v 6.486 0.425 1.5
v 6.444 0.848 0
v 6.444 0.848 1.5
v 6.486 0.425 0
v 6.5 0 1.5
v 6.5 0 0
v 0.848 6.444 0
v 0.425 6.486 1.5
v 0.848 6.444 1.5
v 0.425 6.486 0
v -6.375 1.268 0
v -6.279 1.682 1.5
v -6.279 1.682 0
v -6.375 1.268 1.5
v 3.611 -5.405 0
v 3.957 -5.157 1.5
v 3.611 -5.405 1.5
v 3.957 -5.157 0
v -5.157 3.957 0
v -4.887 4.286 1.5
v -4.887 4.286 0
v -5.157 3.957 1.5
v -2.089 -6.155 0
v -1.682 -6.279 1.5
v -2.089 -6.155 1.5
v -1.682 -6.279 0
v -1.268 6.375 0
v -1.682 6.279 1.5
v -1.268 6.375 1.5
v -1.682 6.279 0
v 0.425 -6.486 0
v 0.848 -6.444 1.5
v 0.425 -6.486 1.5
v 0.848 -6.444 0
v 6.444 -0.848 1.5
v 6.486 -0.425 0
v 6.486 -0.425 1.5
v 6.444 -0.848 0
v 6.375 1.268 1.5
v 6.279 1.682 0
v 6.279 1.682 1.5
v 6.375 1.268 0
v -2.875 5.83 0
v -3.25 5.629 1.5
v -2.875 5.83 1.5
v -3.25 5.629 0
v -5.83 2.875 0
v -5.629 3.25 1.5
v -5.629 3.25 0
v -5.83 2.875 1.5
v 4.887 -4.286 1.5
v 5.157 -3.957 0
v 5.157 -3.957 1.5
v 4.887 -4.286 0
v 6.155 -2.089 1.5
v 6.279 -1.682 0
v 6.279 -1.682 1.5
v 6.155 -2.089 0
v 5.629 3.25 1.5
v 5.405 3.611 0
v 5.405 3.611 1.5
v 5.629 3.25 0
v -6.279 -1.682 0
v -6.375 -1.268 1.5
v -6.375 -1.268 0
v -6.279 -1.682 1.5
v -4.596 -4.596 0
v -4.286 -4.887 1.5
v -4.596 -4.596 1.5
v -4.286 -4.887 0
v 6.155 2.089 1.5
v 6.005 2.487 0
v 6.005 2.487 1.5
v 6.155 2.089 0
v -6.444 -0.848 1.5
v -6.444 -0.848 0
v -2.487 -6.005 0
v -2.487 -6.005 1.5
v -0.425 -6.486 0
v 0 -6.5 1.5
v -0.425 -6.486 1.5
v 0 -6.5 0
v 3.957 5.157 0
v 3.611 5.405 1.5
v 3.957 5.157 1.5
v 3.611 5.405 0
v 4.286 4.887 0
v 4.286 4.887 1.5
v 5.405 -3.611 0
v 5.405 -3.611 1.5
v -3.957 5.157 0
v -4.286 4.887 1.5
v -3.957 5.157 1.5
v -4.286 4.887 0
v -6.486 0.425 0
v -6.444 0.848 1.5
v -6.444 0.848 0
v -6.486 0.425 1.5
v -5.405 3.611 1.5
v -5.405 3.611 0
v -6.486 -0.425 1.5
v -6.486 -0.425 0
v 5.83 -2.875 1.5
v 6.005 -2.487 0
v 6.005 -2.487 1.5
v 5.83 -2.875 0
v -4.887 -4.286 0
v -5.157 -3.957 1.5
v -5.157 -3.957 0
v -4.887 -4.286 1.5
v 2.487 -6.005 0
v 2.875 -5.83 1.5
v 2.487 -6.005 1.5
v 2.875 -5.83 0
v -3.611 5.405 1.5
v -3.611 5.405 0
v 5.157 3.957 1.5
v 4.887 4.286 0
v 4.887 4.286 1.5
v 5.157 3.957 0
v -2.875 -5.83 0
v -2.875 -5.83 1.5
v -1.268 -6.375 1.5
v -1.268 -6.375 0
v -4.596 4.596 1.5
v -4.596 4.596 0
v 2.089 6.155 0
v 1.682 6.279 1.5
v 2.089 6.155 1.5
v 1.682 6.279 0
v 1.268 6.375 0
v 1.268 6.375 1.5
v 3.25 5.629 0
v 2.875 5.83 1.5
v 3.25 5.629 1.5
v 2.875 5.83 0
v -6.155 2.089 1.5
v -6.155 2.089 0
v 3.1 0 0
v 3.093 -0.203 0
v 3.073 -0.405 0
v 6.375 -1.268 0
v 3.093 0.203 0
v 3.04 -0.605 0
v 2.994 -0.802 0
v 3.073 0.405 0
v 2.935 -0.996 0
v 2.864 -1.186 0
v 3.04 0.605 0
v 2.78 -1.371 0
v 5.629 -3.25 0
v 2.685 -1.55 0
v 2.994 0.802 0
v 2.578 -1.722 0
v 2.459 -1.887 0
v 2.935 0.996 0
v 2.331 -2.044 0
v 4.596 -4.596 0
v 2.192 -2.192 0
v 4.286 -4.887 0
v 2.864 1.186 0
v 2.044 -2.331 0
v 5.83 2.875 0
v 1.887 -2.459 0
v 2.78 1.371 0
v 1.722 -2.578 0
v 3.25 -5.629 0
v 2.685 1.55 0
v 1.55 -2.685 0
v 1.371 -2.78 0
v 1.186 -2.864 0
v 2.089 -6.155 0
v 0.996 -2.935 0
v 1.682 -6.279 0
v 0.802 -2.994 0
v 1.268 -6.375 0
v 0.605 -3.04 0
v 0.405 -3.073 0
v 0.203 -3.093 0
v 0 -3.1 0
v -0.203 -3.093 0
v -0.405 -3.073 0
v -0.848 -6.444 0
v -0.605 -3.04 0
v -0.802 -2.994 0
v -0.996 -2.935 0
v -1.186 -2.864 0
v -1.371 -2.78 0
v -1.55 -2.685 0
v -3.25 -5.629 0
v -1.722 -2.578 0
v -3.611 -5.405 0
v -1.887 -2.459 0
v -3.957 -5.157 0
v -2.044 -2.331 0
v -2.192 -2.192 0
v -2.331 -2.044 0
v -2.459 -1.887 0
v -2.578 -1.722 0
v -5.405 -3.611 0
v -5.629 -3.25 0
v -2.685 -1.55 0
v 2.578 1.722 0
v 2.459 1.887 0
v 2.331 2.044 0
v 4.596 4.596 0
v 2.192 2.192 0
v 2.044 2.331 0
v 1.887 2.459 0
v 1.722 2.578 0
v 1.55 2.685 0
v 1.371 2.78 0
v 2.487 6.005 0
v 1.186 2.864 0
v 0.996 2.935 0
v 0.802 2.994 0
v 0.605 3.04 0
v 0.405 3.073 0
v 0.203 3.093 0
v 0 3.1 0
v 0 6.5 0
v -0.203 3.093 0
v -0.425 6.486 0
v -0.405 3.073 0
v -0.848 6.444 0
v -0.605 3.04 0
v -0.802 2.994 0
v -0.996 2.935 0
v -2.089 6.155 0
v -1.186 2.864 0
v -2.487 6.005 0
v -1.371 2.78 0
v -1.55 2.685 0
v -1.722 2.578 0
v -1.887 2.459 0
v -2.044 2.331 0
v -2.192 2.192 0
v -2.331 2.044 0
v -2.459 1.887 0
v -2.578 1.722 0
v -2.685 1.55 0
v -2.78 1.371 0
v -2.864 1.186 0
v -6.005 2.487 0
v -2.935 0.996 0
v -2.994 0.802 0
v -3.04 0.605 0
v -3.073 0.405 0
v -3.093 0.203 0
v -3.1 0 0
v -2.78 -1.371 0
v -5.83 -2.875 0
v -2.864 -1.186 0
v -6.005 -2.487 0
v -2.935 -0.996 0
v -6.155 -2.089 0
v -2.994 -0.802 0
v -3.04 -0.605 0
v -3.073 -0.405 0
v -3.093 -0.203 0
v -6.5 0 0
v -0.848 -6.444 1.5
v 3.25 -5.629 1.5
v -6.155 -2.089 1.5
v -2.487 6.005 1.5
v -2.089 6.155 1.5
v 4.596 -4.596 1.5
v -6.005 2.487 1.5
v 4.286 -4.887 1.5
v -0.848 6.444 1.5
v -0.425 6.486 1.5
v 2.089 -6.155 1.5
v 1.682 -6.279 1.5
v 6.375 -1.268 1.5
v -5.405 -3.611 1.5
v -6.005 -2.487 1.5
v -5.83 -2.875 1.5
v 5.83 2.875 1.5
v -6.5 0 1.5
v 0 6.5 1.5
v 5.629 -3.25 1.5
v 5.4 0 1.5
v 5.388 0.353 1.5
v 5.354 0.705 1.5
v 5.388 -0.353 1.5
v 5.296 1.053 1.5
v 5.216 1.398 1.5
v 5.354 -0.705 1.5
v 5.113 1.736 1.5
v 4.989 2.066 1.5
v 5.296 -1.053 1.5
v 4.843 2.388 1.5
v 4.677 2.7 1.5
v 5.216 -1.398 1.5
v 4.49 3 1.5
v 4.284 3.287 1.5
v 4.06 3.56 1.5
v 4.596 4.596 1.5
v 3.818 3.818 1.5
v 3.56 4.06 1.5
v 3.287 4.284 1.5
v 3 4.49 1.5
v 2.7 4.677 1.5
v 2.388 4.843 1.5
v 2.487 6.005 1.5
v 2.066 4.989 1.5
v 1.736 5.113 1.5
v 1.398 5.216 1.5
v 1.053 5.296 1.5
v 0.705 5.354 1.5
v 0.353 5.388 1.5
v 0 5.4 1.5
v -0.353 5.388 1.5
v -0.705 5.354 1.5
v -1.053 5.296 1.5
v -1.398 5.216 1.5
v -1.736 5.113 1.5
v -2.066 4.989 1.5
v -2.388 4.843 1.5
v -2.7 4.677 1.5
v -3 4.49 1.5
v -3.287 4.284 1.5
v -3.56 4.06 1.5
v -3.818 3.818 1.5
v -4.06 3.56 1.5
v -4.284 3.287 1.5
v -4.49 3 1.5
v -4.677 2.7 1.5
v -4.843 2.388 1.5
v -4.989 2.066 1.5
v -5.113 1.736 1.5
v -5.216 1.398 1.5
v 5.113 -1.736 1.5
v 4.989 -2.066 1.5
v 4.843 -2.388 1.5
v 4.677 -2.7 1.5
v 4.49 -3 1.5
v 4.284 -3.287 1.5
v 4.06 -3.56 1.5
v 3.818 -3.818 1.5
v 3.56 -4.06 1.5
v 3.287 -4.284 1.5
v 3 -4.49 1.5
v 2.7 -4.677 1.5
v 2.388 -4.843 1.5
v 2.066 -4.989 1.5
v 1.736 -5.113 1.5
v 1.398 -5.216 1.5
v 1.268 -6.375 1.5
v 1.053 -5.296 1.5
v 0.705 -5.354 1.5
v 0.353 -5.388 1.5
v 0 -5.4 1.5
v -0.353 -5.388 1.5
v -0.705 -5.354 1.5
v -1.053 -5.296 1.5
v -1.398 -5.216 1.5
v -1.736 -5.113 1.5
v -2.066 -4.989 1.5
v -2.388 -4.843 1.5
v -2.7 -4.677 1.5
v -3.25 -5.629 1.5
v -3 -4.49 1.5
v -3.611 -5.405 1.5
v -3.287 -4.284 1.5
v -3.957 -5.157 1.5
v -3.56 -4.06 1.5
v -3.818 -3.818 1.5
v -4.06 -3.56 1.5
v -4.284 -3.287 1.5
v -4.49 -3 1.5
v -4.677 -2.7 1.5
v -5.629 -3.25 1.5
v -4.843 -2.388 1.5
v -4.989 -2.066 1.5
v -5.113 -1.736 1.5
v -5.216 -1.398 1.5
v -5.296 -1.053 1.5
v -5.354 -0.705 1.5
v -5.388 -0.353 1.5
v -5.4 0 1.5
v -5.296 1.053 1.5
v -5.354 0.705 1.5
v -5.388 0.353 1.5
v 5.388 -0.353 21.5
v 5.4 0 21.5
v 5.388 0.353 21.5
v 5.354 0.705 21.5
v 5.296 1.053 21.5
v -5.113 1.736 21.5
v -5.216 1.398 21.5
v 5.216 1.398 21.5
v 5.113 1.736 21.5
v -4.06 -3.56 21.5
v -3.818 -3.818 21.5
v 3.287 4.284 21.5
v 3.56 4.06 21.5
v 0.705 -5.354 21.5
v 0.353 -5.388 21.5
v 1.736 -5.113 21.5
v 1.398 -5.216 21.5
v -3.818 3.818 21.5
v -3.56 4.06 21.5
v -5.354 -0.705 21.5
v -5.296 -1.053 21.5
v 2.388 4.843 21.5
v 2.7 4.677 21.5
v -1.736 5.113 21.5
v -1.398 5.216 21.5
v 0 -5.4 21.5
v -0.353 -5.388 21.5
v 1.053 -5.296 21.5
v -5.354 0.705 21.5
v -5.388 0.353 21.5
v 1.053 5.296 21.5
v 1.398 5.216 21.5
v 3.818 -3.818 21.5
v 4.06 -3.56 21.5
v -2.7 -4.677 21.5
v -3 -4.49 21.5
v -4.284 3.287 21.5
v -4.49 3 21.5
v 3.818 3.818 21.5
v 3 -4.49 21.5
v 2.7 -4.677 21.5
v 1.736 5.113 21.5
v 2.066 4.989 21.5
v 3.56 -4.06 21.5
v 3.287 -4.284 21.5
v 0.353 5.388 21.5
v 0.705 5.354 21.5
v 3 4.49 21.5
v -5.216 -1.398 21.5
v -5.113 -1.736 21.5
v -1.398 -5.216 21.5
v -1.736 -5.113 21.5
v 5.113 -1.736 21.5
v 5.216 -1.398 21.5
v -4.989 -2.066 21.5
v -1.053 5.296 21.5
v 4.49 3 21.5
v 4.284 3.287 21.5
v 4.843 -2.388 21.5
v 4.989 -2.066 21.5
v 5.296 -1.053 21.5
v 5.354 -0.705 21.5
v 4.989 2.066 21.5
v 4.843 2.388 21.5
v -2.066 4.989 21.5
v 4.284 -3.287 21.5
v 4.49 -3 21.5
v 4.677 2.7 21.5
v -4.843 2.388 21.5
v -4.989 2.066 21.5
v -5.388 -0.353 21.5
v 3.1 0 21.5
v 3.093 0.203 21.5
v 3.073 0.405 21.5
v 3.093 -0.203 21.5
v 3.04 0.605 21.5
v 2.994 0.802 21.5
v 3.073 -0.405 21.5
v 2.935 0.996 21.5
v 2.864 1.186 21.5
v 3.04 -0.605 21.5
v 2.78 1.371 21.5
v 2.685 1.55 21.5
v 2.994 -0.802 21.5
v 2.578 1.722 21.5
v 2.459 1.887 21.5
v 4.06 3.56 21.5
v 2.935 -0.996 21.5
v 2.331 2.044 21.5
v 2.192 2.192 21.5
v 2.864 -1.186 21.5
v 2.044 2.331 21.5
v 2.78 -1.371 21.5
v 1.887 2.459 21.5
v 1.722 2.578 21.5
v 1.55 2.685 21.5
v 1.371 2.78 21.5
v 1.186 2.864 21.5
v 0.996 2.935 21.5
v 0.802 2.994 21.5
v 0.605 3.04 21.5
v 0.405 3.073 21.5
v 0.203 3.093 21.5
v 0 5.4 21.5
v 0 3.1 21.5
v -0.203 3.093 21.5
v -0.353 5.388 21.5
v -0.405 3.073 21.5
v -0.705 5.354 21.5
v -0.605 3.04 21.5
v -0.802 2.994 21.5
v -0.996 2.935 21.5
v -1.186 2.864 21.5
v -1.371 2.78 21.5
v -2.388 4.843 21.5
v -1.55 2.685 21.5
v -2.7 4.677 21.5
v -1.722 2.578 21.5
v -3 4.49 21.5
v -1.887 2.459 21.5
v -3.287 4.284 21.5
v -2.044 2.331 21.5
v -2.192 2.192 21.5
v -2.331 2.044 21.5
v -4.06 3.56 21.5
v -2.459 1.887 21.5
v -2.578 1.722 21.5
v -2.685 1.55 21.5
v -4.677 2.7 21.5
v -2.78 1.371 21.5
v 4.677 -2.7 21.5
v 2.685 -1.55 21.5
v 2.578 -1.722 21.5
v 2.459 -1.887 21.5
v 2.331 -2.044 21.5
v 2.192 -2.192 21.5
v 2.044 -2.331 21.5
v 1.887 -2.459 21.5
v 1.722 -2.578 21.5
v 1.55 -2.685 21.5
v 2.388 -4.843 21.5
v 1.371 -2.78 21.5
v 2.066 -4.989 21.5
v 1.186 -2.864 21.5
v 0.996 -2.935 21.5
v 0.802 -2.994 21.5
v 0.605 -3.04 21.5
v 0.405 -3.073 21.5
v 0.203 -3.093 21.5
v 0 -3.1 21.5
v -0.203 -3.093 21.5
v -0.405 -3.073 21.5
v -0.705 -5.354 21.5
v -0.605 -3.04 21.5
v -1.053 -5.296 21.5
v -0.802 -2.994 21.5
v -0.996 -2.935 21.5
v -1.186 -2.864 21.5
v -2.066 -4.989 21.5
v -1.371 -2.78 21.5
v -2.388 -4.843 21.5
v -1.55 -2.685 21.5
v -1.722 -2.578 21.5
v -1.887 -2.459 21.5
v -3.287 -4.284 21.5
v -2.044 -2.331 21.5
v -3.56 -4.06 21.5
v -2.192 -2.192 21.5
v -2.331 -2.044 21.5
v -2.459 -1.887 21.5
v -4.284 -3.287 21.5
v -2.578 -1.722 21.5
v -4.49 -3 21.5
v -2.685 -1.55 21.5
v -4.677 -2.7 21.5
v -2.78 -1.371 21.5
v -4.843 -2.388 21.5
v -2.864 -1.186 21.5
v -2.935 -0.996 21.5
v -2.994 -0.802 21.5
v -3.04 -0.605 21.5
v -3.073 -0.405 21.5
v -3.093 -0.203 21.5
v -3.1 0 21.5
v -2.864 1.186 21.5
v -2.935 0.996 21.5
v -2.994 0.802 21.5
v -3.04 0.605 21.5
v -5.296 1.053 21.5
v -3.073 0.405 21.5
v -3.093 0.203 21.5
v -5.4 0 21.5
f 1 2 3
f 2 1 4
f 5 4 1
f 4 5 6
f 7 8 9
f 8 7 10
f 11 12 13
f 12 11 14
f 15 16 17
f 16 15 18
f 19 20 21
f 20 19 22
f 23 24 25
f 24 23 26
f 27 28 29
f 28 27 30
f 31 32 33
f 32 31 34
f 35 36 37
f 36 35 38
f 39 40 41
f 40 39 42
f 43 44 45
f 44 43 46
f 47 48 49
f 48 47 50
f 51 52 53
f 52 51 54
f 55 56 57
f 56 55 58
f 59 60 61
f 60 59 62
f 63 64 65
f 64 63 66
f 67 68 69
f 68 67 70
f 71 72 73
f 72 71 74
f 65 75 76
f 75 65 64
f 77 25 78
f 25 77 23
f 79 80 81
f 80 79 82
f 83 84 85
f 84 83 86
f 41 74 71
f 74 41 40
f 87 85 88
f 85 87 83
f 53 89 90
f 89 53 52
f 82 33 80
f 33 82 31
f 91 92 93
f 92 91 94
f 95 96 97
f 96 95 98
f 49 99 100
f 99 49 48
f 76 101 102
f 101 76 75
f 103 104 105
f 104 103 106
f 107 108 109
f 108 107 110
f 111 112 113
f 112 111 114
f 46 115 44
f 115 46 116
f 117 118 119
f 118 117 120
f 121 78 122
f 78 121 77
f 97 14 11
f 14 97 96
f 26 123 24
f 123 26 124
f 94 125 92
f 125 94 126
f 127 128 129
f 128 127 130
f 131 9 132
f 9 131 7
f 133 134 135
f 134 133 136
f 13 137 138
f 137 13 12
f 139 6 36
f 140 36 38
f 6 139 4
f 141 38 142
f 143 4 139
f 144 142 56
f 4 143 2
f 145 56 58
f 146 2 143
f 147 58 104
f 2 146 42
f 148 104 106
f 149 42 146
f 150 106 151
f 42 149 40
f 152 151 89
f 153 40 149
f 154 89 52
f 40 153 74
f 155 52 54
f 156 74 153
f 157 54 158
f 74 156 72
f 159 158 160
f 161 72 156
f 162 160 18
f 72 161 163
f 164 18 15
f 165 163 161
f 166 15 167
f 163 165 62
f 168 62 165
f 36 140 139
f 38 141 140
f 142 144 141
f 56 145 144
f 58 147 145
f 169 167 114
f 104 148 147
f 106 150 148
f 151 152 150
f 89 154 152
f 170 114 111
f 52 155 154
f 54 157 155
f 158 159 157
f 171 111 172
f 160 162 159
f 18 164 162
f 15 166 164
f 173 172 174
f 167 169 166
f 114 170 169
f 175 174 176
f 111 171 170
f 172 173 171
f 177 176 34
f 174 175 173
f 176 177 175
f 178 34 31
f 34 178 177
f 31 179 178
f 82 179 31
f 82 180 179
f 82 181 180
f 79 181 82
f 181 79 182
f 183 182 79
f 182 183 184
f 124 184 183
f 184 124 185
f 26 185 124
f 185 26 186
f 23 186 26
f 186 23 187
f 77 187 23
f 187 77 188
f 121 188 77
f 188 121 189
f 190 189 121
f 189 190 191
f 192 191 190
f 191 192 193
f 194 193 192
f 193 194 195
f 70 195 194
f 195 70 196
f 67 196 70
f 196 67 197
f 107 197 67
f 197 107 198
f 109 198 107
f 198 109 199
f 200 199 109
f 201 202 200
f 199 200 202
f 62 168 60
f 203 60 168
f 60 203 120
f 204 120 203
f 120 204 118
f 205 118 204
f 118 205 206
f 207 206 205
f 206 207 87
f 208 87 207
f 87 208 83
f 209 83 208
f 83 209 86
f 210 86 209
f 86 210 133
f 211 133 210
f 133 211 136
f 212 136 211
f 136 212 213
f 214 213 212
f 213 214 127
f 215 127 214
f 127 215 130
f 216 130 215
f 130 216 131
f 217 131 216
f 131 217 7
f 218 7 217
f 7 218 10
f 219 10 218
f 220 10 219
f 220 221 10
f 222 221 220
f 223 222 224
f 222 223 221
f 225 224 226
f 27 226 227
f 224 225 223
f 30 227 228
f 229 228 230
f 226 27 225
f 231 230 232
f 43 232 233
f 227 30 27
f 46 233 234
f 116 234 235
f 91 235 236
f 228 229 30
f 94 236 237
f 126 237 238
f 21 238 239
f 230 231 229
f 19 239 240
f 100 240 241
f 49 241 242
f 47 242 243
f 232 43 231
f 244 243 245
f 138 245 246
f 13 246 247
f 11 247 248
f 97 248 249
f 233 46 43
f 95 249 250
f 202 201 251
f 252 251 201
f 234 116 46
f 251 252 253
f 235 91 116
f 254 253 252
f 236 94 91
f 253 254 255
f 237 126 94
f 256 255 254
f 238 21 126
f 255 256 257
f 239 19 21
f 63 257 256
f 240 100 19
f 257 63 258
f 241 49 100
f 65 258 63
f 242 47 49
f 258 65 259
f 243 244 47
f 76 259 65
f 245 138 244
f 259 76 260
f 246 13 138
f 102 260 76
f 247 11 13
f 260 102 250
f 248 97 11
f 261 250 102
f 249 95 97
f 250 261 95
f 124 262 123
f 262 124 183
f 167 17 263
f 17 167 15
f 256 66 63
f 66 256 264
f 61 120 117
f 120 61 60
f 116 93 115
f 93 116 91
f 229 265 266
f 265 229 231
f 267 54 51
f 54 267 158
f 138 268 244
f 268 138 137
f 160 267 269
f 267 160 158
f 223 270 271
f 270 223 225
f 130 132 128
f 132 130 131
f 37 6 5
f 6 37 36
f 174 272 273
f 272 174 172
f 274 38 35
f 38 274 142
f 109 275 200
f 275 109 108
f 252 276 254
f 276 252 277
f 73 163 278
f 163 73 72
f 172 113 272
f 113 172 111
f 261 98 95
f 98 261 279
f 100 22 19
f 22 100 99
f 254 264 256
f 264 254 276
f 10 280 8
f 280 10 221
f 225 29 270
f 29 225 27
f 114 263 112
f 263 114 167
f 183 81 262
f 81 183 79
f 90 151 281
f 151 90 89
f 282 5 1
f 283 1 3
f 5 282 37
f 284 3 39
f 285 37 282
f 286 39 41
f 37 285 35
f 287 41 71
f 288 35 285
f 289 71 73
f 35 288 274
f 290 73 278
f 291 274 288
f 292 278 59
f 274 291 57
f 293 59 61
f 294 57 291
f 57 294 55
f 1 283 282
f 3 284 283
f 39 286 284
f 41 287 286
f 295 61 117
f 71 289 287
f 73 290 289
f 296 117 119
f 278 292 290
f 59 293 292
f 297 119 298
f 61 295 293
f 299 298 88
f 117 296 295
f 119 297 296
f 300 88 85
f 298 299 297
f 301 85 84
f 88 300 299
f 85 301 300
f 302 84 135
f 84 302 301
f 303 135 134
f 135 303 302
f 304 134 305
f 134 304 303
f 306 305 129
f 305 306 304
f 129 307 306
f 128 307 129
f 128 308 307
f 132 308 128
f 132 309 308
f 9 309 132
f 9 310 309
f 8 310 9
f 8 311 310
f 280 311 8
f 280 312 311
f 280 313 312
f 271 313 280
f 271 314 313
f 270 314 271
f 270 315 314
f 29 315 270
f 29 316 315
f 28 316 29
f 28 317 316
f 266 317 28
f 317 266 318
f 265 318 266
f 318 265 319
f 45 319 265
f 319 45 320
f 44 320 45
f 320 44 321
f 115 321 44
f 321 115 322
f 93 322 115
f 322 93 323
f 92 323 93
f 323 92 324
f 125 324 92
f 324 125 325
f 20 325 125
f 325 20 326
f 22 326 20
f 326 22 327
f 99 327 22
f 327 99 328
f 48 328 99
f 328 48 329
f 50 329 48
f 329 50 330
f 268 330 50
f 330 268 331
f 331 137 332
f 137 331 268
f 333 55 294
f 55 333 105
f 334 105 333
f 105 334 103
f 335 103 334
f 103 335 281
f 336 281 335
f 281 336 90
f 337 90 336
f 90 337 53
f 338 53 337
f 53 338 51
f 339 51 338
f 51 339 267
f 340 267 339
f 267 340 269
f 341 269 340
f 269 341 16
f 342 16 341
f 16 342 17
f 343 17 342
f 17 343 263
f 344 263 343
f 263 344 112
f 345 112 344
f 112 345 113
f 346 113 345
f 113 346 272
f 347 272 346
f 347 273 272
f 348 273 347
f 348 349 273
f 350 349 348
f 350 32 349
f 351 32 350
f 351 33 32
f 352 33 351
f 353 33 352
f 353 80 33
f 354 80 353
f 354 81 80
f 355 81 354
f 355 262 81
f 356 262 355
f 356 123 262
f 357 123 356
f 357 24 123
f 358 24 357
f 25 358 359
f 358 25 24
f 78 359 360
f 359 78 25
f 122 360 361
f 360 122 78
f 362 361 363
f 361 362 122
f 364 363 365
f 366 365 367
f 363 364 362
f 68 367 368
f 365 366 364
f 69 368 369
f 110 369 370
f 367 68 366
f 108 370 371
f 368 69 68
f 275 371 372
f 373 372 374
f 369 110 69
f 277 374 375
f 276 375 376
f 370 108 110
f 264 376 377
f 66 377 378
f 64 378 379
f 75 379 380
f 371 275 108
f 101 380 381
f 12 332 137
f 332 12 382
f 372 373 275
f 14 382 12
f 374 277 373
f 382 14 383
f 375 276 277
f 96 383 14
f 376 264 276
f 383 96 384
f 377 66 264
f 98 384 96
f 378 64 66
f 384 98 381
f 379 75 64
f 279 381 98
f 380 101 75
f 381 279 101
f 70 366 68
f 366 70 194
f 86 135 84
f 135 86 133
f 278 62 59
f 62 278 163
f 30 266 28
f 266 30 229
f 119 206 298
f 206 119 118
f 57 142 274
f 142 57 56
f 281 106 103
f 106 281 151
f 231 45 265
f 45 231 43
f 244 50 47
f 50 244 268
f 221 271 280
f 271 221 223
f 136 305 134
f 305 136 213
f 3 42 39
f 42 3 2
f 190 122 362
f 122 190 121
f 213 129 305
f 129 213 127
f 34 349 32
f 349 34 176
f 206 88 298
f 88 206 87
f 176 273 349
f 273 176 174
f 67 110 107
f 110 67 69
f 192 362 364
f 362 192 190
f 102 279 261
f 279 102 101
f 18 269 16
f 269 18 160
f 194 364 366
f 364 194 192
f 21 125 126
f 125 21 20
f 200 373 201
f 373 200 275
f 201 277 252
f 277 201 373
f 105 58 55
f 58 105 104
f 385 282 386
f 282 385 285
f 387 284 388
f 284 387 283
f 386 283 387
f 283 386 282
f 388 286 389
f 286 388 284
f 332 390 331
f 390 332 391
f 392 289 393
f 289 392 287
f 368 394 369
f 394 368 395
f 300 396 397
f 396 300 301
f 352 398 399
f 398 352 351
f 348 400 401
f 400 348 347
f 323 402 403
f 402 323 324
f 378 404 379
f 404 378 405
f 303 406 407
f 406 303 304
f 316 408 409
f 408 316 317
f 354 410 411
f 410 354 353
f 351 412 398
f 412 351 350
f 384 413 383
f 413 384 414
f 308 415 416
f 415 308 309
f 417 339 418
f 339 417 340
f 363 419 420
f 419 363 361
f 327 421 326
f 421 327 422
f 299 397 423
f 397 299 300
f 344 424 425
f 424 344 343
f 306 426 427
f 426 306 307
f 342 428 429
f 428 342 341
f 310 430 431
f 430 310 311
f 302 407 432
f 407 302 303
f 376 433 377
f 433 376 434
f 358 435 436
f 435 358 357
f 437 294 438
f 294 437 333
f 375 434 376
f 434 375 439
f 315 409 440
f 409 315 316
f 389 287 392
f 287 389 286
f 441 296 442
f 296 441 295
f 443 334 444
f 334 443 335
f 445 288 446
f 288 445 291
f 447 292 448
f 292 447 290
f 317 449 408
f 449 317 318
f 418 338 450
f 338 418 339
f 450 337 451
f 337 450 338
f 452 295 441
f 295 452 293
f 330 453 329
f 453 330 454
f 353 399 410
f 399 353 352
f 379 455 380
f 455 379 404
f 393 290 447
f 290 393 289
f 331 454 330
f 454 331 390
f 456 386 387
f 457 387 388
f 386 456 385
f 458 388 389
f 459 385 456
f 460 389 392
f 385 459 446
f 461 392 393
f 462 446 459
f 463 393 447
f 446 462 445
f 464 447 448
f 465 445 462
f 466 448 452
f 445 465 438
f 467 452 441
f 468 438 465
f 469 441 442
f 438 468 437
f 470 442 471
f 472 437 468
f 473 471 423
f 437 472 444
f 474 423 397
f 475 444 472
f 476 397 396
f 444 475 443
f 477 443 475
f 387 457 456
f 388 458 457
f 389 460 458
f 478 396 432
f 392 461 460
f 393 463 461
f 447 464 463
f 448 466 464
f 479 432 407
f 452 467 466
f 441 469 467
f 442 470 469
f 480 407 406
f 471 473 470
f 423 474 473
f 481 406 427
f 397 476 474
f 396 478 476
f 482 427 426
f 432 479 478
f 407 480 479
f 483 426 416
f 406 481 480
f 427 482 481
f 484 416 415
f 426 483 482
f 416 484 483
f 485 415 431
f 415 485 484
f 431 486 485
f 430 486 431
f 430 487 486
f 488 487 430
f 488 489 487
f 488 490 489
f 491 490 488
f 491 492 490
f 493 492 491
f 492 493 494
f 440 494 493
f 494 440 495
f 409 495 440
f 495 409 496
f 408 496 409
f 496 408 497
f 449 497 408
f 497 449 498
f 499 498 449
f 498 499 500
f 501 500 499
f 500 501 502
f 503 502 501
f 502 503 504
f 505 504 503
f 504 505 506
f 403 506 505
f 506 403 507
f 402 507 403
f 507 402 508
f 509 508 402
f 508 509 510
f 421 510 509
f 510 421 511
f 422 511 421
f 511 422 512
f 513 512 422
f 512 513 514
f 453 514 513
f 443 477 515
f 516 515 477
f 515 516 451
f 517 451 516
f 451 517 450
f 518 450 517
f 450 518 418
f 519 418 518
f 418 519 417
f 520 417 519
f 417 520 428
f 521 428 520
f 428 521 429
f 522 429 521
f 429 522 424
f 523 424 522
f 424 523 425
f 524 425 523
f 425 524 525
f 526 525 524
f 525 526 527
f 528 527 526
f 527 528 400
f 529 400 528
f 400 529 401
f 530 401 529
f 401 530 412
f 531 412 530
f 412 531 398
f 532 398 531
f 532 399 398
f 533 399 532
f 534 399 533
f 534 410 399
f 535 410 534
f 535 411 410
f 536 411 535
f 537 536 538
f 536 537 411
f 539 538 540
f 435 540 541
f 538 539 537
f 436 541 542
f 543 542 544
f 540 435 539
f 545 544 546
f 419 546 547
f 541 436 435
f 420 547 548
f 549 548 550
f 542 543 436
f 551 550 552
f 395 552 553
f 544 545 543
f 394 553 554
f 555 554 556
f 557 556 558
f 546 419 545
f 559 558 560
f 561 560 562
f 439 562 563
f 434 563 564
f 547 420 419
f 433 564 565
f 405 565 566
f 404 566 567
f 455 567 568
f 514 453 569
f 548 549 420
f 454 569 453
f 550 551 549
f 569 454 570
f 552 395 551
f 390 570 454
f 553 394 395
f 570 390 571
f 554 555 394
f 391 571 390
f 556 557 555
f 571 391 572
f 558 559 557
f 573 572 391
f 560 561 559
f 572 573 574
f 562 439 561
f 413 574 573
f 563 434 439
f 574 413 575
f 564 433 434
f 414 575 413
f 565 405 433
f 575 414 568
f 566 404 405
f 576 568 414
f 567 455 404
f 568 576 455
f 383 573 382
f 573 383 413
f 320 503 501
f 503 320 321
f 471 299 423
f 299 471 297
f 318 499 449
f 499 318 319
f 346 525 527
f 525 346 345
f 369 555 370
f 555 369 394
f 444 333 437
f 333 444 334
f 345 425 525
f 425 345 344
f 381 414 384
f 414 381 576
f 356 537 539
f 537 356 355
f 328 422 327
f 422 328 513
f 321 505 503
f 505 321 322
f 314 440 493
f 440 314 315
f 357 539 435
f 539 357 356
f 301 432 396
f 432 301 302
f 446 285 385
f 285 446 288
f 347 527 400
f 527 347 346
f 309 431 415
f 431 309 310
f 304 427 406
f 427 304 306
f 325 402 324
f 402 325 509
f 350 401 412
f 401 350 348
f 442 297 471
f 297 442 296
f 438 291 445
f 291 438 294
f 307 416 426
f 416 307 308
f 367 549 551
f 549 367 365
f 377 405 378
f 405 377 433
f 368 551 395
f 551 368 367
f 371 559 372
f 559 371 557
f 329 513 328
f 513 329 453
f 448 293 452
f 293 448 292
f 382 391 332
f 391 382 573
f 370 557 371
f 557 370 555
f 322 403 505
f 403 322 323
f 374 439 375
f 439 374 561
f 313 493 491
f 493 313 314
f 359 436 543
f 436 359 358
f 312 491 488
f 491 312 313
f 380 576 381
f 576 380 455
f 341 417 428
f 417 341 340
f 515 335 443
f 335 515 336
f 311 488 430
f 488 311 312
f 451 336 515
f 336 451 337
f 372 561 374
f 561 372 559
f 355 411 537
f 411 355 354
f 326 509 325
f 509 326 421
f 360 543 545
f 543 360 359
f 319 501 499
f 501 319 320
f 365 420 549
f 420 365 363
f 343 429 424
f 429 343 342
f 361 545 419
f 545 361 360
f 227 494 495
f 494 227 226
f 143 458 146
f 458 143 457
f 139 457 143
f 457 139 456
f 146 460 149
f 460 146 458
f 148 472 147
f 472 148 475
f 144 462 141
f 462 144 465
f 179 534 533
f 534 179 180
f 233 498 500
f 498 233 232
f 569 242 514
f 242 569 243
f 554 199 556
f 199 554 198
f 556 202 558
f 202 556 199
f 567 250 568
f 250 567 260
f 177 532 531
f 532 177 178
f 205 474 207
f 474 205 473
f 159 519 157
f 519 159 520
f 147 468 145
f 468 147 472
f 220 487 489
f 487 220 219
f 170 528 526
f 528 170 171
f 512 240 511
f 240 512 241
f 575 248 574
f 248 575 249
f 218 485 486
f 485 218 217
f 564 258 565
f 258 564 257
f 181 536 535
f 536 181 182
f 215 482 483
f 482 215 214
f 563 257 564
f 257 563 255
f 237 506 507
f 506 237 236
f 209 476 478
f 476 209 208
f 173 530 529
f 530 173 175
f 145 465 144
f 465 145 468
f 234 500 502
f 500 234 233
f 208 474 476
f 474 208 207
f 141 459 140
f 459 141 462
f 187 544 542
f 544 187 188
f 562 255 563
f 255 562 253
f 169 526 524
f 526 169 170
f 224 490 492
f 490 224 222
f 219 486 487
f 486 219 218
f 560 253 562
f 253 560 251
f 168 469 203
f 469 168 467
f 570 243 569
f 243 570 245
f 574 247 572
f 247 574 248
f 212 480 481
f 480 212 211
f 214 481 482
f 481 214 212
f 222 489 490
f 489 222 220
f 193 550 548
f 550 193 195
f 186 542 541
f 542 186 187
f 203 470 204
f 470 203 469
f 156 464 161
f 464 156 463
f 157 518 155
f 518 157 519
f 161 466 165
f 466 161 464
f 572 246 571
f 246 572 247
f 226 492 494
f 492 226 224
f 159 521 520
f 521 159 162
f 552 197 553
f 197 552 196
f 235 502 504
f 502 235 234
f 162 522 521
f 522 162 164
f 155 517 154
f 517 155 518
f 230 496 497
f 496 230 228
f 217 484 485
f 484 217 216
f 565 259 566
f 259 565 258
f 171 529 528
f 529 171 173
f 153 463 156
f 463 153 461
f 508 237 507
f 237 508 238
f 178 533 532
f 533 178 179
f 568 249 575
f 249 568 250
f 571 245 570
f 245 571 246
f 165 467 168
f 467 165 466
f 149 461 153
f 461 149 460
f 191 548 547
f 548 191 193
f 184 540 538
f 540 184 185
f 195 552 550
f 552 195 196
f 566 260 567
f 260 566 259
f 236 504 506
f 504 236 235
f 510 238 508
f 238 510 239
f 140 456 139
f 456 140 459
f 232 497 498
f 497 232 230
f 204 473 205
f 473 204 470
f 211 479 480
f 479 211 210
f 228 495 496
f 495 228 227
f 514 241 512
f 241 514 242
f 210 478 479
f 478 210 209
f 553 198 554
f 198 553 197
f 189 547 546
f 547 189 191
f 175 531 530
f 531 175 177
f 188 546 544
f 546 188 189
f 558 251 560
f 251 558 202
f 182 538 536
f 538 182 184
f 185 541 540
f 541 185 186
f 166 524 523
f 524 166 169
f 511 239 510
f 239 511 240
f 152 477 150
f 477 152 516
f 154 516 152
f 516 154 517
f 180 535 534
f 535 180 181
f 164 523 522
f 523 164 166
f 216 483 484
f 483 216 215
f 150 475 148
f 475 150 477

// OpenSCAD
// PCR tube adapter sleeve: fits a 0.2 mL tube in a 1.5 mL rack hole
// Print orientation: collar on bed (z = 0), sleeve body rises to z = 21.5

// ---------------- Parameters ----------------
collar_d      = 13;    // collar outer diameter (mm)
collar_t      = 1.5;   // collar thickness (mm)
sleeve_d      = 10.8;  // sleeve body outer diameter (mm)
sleeve_h      = 20;    // sleeve body height (mm), top at z = 21.5
bore_d        = 6.2;   // through-bore diameter (mm)
eps           = 0.5;   // cutter overshoot past faces (mm)
$fn           = 96;    // curve resolution

// Derived
sleeve_r = sleeve_d / 2;
collar_r = collar_d / 2;

// ---------------- Model ----------------
difference() {
    union() {
        // Collar: z = 0 to 1.5
        cylinder(r = collar_r, h = collar_t);

        // Sleeve body: z = 1.5 to 21.5 (slight overlap into collar for clean union)
        translate([0, 0, collar_t - 0.01])
            cylinder(r = sleeve_r, h = sleeve_h + 0.01);
    }

    // Straight through-bore, open at both ends
    translate([0, 0, -eps])
        cylinder(d = bore_d, h = collar_t + sleeve_h + 2 * eps);
}
